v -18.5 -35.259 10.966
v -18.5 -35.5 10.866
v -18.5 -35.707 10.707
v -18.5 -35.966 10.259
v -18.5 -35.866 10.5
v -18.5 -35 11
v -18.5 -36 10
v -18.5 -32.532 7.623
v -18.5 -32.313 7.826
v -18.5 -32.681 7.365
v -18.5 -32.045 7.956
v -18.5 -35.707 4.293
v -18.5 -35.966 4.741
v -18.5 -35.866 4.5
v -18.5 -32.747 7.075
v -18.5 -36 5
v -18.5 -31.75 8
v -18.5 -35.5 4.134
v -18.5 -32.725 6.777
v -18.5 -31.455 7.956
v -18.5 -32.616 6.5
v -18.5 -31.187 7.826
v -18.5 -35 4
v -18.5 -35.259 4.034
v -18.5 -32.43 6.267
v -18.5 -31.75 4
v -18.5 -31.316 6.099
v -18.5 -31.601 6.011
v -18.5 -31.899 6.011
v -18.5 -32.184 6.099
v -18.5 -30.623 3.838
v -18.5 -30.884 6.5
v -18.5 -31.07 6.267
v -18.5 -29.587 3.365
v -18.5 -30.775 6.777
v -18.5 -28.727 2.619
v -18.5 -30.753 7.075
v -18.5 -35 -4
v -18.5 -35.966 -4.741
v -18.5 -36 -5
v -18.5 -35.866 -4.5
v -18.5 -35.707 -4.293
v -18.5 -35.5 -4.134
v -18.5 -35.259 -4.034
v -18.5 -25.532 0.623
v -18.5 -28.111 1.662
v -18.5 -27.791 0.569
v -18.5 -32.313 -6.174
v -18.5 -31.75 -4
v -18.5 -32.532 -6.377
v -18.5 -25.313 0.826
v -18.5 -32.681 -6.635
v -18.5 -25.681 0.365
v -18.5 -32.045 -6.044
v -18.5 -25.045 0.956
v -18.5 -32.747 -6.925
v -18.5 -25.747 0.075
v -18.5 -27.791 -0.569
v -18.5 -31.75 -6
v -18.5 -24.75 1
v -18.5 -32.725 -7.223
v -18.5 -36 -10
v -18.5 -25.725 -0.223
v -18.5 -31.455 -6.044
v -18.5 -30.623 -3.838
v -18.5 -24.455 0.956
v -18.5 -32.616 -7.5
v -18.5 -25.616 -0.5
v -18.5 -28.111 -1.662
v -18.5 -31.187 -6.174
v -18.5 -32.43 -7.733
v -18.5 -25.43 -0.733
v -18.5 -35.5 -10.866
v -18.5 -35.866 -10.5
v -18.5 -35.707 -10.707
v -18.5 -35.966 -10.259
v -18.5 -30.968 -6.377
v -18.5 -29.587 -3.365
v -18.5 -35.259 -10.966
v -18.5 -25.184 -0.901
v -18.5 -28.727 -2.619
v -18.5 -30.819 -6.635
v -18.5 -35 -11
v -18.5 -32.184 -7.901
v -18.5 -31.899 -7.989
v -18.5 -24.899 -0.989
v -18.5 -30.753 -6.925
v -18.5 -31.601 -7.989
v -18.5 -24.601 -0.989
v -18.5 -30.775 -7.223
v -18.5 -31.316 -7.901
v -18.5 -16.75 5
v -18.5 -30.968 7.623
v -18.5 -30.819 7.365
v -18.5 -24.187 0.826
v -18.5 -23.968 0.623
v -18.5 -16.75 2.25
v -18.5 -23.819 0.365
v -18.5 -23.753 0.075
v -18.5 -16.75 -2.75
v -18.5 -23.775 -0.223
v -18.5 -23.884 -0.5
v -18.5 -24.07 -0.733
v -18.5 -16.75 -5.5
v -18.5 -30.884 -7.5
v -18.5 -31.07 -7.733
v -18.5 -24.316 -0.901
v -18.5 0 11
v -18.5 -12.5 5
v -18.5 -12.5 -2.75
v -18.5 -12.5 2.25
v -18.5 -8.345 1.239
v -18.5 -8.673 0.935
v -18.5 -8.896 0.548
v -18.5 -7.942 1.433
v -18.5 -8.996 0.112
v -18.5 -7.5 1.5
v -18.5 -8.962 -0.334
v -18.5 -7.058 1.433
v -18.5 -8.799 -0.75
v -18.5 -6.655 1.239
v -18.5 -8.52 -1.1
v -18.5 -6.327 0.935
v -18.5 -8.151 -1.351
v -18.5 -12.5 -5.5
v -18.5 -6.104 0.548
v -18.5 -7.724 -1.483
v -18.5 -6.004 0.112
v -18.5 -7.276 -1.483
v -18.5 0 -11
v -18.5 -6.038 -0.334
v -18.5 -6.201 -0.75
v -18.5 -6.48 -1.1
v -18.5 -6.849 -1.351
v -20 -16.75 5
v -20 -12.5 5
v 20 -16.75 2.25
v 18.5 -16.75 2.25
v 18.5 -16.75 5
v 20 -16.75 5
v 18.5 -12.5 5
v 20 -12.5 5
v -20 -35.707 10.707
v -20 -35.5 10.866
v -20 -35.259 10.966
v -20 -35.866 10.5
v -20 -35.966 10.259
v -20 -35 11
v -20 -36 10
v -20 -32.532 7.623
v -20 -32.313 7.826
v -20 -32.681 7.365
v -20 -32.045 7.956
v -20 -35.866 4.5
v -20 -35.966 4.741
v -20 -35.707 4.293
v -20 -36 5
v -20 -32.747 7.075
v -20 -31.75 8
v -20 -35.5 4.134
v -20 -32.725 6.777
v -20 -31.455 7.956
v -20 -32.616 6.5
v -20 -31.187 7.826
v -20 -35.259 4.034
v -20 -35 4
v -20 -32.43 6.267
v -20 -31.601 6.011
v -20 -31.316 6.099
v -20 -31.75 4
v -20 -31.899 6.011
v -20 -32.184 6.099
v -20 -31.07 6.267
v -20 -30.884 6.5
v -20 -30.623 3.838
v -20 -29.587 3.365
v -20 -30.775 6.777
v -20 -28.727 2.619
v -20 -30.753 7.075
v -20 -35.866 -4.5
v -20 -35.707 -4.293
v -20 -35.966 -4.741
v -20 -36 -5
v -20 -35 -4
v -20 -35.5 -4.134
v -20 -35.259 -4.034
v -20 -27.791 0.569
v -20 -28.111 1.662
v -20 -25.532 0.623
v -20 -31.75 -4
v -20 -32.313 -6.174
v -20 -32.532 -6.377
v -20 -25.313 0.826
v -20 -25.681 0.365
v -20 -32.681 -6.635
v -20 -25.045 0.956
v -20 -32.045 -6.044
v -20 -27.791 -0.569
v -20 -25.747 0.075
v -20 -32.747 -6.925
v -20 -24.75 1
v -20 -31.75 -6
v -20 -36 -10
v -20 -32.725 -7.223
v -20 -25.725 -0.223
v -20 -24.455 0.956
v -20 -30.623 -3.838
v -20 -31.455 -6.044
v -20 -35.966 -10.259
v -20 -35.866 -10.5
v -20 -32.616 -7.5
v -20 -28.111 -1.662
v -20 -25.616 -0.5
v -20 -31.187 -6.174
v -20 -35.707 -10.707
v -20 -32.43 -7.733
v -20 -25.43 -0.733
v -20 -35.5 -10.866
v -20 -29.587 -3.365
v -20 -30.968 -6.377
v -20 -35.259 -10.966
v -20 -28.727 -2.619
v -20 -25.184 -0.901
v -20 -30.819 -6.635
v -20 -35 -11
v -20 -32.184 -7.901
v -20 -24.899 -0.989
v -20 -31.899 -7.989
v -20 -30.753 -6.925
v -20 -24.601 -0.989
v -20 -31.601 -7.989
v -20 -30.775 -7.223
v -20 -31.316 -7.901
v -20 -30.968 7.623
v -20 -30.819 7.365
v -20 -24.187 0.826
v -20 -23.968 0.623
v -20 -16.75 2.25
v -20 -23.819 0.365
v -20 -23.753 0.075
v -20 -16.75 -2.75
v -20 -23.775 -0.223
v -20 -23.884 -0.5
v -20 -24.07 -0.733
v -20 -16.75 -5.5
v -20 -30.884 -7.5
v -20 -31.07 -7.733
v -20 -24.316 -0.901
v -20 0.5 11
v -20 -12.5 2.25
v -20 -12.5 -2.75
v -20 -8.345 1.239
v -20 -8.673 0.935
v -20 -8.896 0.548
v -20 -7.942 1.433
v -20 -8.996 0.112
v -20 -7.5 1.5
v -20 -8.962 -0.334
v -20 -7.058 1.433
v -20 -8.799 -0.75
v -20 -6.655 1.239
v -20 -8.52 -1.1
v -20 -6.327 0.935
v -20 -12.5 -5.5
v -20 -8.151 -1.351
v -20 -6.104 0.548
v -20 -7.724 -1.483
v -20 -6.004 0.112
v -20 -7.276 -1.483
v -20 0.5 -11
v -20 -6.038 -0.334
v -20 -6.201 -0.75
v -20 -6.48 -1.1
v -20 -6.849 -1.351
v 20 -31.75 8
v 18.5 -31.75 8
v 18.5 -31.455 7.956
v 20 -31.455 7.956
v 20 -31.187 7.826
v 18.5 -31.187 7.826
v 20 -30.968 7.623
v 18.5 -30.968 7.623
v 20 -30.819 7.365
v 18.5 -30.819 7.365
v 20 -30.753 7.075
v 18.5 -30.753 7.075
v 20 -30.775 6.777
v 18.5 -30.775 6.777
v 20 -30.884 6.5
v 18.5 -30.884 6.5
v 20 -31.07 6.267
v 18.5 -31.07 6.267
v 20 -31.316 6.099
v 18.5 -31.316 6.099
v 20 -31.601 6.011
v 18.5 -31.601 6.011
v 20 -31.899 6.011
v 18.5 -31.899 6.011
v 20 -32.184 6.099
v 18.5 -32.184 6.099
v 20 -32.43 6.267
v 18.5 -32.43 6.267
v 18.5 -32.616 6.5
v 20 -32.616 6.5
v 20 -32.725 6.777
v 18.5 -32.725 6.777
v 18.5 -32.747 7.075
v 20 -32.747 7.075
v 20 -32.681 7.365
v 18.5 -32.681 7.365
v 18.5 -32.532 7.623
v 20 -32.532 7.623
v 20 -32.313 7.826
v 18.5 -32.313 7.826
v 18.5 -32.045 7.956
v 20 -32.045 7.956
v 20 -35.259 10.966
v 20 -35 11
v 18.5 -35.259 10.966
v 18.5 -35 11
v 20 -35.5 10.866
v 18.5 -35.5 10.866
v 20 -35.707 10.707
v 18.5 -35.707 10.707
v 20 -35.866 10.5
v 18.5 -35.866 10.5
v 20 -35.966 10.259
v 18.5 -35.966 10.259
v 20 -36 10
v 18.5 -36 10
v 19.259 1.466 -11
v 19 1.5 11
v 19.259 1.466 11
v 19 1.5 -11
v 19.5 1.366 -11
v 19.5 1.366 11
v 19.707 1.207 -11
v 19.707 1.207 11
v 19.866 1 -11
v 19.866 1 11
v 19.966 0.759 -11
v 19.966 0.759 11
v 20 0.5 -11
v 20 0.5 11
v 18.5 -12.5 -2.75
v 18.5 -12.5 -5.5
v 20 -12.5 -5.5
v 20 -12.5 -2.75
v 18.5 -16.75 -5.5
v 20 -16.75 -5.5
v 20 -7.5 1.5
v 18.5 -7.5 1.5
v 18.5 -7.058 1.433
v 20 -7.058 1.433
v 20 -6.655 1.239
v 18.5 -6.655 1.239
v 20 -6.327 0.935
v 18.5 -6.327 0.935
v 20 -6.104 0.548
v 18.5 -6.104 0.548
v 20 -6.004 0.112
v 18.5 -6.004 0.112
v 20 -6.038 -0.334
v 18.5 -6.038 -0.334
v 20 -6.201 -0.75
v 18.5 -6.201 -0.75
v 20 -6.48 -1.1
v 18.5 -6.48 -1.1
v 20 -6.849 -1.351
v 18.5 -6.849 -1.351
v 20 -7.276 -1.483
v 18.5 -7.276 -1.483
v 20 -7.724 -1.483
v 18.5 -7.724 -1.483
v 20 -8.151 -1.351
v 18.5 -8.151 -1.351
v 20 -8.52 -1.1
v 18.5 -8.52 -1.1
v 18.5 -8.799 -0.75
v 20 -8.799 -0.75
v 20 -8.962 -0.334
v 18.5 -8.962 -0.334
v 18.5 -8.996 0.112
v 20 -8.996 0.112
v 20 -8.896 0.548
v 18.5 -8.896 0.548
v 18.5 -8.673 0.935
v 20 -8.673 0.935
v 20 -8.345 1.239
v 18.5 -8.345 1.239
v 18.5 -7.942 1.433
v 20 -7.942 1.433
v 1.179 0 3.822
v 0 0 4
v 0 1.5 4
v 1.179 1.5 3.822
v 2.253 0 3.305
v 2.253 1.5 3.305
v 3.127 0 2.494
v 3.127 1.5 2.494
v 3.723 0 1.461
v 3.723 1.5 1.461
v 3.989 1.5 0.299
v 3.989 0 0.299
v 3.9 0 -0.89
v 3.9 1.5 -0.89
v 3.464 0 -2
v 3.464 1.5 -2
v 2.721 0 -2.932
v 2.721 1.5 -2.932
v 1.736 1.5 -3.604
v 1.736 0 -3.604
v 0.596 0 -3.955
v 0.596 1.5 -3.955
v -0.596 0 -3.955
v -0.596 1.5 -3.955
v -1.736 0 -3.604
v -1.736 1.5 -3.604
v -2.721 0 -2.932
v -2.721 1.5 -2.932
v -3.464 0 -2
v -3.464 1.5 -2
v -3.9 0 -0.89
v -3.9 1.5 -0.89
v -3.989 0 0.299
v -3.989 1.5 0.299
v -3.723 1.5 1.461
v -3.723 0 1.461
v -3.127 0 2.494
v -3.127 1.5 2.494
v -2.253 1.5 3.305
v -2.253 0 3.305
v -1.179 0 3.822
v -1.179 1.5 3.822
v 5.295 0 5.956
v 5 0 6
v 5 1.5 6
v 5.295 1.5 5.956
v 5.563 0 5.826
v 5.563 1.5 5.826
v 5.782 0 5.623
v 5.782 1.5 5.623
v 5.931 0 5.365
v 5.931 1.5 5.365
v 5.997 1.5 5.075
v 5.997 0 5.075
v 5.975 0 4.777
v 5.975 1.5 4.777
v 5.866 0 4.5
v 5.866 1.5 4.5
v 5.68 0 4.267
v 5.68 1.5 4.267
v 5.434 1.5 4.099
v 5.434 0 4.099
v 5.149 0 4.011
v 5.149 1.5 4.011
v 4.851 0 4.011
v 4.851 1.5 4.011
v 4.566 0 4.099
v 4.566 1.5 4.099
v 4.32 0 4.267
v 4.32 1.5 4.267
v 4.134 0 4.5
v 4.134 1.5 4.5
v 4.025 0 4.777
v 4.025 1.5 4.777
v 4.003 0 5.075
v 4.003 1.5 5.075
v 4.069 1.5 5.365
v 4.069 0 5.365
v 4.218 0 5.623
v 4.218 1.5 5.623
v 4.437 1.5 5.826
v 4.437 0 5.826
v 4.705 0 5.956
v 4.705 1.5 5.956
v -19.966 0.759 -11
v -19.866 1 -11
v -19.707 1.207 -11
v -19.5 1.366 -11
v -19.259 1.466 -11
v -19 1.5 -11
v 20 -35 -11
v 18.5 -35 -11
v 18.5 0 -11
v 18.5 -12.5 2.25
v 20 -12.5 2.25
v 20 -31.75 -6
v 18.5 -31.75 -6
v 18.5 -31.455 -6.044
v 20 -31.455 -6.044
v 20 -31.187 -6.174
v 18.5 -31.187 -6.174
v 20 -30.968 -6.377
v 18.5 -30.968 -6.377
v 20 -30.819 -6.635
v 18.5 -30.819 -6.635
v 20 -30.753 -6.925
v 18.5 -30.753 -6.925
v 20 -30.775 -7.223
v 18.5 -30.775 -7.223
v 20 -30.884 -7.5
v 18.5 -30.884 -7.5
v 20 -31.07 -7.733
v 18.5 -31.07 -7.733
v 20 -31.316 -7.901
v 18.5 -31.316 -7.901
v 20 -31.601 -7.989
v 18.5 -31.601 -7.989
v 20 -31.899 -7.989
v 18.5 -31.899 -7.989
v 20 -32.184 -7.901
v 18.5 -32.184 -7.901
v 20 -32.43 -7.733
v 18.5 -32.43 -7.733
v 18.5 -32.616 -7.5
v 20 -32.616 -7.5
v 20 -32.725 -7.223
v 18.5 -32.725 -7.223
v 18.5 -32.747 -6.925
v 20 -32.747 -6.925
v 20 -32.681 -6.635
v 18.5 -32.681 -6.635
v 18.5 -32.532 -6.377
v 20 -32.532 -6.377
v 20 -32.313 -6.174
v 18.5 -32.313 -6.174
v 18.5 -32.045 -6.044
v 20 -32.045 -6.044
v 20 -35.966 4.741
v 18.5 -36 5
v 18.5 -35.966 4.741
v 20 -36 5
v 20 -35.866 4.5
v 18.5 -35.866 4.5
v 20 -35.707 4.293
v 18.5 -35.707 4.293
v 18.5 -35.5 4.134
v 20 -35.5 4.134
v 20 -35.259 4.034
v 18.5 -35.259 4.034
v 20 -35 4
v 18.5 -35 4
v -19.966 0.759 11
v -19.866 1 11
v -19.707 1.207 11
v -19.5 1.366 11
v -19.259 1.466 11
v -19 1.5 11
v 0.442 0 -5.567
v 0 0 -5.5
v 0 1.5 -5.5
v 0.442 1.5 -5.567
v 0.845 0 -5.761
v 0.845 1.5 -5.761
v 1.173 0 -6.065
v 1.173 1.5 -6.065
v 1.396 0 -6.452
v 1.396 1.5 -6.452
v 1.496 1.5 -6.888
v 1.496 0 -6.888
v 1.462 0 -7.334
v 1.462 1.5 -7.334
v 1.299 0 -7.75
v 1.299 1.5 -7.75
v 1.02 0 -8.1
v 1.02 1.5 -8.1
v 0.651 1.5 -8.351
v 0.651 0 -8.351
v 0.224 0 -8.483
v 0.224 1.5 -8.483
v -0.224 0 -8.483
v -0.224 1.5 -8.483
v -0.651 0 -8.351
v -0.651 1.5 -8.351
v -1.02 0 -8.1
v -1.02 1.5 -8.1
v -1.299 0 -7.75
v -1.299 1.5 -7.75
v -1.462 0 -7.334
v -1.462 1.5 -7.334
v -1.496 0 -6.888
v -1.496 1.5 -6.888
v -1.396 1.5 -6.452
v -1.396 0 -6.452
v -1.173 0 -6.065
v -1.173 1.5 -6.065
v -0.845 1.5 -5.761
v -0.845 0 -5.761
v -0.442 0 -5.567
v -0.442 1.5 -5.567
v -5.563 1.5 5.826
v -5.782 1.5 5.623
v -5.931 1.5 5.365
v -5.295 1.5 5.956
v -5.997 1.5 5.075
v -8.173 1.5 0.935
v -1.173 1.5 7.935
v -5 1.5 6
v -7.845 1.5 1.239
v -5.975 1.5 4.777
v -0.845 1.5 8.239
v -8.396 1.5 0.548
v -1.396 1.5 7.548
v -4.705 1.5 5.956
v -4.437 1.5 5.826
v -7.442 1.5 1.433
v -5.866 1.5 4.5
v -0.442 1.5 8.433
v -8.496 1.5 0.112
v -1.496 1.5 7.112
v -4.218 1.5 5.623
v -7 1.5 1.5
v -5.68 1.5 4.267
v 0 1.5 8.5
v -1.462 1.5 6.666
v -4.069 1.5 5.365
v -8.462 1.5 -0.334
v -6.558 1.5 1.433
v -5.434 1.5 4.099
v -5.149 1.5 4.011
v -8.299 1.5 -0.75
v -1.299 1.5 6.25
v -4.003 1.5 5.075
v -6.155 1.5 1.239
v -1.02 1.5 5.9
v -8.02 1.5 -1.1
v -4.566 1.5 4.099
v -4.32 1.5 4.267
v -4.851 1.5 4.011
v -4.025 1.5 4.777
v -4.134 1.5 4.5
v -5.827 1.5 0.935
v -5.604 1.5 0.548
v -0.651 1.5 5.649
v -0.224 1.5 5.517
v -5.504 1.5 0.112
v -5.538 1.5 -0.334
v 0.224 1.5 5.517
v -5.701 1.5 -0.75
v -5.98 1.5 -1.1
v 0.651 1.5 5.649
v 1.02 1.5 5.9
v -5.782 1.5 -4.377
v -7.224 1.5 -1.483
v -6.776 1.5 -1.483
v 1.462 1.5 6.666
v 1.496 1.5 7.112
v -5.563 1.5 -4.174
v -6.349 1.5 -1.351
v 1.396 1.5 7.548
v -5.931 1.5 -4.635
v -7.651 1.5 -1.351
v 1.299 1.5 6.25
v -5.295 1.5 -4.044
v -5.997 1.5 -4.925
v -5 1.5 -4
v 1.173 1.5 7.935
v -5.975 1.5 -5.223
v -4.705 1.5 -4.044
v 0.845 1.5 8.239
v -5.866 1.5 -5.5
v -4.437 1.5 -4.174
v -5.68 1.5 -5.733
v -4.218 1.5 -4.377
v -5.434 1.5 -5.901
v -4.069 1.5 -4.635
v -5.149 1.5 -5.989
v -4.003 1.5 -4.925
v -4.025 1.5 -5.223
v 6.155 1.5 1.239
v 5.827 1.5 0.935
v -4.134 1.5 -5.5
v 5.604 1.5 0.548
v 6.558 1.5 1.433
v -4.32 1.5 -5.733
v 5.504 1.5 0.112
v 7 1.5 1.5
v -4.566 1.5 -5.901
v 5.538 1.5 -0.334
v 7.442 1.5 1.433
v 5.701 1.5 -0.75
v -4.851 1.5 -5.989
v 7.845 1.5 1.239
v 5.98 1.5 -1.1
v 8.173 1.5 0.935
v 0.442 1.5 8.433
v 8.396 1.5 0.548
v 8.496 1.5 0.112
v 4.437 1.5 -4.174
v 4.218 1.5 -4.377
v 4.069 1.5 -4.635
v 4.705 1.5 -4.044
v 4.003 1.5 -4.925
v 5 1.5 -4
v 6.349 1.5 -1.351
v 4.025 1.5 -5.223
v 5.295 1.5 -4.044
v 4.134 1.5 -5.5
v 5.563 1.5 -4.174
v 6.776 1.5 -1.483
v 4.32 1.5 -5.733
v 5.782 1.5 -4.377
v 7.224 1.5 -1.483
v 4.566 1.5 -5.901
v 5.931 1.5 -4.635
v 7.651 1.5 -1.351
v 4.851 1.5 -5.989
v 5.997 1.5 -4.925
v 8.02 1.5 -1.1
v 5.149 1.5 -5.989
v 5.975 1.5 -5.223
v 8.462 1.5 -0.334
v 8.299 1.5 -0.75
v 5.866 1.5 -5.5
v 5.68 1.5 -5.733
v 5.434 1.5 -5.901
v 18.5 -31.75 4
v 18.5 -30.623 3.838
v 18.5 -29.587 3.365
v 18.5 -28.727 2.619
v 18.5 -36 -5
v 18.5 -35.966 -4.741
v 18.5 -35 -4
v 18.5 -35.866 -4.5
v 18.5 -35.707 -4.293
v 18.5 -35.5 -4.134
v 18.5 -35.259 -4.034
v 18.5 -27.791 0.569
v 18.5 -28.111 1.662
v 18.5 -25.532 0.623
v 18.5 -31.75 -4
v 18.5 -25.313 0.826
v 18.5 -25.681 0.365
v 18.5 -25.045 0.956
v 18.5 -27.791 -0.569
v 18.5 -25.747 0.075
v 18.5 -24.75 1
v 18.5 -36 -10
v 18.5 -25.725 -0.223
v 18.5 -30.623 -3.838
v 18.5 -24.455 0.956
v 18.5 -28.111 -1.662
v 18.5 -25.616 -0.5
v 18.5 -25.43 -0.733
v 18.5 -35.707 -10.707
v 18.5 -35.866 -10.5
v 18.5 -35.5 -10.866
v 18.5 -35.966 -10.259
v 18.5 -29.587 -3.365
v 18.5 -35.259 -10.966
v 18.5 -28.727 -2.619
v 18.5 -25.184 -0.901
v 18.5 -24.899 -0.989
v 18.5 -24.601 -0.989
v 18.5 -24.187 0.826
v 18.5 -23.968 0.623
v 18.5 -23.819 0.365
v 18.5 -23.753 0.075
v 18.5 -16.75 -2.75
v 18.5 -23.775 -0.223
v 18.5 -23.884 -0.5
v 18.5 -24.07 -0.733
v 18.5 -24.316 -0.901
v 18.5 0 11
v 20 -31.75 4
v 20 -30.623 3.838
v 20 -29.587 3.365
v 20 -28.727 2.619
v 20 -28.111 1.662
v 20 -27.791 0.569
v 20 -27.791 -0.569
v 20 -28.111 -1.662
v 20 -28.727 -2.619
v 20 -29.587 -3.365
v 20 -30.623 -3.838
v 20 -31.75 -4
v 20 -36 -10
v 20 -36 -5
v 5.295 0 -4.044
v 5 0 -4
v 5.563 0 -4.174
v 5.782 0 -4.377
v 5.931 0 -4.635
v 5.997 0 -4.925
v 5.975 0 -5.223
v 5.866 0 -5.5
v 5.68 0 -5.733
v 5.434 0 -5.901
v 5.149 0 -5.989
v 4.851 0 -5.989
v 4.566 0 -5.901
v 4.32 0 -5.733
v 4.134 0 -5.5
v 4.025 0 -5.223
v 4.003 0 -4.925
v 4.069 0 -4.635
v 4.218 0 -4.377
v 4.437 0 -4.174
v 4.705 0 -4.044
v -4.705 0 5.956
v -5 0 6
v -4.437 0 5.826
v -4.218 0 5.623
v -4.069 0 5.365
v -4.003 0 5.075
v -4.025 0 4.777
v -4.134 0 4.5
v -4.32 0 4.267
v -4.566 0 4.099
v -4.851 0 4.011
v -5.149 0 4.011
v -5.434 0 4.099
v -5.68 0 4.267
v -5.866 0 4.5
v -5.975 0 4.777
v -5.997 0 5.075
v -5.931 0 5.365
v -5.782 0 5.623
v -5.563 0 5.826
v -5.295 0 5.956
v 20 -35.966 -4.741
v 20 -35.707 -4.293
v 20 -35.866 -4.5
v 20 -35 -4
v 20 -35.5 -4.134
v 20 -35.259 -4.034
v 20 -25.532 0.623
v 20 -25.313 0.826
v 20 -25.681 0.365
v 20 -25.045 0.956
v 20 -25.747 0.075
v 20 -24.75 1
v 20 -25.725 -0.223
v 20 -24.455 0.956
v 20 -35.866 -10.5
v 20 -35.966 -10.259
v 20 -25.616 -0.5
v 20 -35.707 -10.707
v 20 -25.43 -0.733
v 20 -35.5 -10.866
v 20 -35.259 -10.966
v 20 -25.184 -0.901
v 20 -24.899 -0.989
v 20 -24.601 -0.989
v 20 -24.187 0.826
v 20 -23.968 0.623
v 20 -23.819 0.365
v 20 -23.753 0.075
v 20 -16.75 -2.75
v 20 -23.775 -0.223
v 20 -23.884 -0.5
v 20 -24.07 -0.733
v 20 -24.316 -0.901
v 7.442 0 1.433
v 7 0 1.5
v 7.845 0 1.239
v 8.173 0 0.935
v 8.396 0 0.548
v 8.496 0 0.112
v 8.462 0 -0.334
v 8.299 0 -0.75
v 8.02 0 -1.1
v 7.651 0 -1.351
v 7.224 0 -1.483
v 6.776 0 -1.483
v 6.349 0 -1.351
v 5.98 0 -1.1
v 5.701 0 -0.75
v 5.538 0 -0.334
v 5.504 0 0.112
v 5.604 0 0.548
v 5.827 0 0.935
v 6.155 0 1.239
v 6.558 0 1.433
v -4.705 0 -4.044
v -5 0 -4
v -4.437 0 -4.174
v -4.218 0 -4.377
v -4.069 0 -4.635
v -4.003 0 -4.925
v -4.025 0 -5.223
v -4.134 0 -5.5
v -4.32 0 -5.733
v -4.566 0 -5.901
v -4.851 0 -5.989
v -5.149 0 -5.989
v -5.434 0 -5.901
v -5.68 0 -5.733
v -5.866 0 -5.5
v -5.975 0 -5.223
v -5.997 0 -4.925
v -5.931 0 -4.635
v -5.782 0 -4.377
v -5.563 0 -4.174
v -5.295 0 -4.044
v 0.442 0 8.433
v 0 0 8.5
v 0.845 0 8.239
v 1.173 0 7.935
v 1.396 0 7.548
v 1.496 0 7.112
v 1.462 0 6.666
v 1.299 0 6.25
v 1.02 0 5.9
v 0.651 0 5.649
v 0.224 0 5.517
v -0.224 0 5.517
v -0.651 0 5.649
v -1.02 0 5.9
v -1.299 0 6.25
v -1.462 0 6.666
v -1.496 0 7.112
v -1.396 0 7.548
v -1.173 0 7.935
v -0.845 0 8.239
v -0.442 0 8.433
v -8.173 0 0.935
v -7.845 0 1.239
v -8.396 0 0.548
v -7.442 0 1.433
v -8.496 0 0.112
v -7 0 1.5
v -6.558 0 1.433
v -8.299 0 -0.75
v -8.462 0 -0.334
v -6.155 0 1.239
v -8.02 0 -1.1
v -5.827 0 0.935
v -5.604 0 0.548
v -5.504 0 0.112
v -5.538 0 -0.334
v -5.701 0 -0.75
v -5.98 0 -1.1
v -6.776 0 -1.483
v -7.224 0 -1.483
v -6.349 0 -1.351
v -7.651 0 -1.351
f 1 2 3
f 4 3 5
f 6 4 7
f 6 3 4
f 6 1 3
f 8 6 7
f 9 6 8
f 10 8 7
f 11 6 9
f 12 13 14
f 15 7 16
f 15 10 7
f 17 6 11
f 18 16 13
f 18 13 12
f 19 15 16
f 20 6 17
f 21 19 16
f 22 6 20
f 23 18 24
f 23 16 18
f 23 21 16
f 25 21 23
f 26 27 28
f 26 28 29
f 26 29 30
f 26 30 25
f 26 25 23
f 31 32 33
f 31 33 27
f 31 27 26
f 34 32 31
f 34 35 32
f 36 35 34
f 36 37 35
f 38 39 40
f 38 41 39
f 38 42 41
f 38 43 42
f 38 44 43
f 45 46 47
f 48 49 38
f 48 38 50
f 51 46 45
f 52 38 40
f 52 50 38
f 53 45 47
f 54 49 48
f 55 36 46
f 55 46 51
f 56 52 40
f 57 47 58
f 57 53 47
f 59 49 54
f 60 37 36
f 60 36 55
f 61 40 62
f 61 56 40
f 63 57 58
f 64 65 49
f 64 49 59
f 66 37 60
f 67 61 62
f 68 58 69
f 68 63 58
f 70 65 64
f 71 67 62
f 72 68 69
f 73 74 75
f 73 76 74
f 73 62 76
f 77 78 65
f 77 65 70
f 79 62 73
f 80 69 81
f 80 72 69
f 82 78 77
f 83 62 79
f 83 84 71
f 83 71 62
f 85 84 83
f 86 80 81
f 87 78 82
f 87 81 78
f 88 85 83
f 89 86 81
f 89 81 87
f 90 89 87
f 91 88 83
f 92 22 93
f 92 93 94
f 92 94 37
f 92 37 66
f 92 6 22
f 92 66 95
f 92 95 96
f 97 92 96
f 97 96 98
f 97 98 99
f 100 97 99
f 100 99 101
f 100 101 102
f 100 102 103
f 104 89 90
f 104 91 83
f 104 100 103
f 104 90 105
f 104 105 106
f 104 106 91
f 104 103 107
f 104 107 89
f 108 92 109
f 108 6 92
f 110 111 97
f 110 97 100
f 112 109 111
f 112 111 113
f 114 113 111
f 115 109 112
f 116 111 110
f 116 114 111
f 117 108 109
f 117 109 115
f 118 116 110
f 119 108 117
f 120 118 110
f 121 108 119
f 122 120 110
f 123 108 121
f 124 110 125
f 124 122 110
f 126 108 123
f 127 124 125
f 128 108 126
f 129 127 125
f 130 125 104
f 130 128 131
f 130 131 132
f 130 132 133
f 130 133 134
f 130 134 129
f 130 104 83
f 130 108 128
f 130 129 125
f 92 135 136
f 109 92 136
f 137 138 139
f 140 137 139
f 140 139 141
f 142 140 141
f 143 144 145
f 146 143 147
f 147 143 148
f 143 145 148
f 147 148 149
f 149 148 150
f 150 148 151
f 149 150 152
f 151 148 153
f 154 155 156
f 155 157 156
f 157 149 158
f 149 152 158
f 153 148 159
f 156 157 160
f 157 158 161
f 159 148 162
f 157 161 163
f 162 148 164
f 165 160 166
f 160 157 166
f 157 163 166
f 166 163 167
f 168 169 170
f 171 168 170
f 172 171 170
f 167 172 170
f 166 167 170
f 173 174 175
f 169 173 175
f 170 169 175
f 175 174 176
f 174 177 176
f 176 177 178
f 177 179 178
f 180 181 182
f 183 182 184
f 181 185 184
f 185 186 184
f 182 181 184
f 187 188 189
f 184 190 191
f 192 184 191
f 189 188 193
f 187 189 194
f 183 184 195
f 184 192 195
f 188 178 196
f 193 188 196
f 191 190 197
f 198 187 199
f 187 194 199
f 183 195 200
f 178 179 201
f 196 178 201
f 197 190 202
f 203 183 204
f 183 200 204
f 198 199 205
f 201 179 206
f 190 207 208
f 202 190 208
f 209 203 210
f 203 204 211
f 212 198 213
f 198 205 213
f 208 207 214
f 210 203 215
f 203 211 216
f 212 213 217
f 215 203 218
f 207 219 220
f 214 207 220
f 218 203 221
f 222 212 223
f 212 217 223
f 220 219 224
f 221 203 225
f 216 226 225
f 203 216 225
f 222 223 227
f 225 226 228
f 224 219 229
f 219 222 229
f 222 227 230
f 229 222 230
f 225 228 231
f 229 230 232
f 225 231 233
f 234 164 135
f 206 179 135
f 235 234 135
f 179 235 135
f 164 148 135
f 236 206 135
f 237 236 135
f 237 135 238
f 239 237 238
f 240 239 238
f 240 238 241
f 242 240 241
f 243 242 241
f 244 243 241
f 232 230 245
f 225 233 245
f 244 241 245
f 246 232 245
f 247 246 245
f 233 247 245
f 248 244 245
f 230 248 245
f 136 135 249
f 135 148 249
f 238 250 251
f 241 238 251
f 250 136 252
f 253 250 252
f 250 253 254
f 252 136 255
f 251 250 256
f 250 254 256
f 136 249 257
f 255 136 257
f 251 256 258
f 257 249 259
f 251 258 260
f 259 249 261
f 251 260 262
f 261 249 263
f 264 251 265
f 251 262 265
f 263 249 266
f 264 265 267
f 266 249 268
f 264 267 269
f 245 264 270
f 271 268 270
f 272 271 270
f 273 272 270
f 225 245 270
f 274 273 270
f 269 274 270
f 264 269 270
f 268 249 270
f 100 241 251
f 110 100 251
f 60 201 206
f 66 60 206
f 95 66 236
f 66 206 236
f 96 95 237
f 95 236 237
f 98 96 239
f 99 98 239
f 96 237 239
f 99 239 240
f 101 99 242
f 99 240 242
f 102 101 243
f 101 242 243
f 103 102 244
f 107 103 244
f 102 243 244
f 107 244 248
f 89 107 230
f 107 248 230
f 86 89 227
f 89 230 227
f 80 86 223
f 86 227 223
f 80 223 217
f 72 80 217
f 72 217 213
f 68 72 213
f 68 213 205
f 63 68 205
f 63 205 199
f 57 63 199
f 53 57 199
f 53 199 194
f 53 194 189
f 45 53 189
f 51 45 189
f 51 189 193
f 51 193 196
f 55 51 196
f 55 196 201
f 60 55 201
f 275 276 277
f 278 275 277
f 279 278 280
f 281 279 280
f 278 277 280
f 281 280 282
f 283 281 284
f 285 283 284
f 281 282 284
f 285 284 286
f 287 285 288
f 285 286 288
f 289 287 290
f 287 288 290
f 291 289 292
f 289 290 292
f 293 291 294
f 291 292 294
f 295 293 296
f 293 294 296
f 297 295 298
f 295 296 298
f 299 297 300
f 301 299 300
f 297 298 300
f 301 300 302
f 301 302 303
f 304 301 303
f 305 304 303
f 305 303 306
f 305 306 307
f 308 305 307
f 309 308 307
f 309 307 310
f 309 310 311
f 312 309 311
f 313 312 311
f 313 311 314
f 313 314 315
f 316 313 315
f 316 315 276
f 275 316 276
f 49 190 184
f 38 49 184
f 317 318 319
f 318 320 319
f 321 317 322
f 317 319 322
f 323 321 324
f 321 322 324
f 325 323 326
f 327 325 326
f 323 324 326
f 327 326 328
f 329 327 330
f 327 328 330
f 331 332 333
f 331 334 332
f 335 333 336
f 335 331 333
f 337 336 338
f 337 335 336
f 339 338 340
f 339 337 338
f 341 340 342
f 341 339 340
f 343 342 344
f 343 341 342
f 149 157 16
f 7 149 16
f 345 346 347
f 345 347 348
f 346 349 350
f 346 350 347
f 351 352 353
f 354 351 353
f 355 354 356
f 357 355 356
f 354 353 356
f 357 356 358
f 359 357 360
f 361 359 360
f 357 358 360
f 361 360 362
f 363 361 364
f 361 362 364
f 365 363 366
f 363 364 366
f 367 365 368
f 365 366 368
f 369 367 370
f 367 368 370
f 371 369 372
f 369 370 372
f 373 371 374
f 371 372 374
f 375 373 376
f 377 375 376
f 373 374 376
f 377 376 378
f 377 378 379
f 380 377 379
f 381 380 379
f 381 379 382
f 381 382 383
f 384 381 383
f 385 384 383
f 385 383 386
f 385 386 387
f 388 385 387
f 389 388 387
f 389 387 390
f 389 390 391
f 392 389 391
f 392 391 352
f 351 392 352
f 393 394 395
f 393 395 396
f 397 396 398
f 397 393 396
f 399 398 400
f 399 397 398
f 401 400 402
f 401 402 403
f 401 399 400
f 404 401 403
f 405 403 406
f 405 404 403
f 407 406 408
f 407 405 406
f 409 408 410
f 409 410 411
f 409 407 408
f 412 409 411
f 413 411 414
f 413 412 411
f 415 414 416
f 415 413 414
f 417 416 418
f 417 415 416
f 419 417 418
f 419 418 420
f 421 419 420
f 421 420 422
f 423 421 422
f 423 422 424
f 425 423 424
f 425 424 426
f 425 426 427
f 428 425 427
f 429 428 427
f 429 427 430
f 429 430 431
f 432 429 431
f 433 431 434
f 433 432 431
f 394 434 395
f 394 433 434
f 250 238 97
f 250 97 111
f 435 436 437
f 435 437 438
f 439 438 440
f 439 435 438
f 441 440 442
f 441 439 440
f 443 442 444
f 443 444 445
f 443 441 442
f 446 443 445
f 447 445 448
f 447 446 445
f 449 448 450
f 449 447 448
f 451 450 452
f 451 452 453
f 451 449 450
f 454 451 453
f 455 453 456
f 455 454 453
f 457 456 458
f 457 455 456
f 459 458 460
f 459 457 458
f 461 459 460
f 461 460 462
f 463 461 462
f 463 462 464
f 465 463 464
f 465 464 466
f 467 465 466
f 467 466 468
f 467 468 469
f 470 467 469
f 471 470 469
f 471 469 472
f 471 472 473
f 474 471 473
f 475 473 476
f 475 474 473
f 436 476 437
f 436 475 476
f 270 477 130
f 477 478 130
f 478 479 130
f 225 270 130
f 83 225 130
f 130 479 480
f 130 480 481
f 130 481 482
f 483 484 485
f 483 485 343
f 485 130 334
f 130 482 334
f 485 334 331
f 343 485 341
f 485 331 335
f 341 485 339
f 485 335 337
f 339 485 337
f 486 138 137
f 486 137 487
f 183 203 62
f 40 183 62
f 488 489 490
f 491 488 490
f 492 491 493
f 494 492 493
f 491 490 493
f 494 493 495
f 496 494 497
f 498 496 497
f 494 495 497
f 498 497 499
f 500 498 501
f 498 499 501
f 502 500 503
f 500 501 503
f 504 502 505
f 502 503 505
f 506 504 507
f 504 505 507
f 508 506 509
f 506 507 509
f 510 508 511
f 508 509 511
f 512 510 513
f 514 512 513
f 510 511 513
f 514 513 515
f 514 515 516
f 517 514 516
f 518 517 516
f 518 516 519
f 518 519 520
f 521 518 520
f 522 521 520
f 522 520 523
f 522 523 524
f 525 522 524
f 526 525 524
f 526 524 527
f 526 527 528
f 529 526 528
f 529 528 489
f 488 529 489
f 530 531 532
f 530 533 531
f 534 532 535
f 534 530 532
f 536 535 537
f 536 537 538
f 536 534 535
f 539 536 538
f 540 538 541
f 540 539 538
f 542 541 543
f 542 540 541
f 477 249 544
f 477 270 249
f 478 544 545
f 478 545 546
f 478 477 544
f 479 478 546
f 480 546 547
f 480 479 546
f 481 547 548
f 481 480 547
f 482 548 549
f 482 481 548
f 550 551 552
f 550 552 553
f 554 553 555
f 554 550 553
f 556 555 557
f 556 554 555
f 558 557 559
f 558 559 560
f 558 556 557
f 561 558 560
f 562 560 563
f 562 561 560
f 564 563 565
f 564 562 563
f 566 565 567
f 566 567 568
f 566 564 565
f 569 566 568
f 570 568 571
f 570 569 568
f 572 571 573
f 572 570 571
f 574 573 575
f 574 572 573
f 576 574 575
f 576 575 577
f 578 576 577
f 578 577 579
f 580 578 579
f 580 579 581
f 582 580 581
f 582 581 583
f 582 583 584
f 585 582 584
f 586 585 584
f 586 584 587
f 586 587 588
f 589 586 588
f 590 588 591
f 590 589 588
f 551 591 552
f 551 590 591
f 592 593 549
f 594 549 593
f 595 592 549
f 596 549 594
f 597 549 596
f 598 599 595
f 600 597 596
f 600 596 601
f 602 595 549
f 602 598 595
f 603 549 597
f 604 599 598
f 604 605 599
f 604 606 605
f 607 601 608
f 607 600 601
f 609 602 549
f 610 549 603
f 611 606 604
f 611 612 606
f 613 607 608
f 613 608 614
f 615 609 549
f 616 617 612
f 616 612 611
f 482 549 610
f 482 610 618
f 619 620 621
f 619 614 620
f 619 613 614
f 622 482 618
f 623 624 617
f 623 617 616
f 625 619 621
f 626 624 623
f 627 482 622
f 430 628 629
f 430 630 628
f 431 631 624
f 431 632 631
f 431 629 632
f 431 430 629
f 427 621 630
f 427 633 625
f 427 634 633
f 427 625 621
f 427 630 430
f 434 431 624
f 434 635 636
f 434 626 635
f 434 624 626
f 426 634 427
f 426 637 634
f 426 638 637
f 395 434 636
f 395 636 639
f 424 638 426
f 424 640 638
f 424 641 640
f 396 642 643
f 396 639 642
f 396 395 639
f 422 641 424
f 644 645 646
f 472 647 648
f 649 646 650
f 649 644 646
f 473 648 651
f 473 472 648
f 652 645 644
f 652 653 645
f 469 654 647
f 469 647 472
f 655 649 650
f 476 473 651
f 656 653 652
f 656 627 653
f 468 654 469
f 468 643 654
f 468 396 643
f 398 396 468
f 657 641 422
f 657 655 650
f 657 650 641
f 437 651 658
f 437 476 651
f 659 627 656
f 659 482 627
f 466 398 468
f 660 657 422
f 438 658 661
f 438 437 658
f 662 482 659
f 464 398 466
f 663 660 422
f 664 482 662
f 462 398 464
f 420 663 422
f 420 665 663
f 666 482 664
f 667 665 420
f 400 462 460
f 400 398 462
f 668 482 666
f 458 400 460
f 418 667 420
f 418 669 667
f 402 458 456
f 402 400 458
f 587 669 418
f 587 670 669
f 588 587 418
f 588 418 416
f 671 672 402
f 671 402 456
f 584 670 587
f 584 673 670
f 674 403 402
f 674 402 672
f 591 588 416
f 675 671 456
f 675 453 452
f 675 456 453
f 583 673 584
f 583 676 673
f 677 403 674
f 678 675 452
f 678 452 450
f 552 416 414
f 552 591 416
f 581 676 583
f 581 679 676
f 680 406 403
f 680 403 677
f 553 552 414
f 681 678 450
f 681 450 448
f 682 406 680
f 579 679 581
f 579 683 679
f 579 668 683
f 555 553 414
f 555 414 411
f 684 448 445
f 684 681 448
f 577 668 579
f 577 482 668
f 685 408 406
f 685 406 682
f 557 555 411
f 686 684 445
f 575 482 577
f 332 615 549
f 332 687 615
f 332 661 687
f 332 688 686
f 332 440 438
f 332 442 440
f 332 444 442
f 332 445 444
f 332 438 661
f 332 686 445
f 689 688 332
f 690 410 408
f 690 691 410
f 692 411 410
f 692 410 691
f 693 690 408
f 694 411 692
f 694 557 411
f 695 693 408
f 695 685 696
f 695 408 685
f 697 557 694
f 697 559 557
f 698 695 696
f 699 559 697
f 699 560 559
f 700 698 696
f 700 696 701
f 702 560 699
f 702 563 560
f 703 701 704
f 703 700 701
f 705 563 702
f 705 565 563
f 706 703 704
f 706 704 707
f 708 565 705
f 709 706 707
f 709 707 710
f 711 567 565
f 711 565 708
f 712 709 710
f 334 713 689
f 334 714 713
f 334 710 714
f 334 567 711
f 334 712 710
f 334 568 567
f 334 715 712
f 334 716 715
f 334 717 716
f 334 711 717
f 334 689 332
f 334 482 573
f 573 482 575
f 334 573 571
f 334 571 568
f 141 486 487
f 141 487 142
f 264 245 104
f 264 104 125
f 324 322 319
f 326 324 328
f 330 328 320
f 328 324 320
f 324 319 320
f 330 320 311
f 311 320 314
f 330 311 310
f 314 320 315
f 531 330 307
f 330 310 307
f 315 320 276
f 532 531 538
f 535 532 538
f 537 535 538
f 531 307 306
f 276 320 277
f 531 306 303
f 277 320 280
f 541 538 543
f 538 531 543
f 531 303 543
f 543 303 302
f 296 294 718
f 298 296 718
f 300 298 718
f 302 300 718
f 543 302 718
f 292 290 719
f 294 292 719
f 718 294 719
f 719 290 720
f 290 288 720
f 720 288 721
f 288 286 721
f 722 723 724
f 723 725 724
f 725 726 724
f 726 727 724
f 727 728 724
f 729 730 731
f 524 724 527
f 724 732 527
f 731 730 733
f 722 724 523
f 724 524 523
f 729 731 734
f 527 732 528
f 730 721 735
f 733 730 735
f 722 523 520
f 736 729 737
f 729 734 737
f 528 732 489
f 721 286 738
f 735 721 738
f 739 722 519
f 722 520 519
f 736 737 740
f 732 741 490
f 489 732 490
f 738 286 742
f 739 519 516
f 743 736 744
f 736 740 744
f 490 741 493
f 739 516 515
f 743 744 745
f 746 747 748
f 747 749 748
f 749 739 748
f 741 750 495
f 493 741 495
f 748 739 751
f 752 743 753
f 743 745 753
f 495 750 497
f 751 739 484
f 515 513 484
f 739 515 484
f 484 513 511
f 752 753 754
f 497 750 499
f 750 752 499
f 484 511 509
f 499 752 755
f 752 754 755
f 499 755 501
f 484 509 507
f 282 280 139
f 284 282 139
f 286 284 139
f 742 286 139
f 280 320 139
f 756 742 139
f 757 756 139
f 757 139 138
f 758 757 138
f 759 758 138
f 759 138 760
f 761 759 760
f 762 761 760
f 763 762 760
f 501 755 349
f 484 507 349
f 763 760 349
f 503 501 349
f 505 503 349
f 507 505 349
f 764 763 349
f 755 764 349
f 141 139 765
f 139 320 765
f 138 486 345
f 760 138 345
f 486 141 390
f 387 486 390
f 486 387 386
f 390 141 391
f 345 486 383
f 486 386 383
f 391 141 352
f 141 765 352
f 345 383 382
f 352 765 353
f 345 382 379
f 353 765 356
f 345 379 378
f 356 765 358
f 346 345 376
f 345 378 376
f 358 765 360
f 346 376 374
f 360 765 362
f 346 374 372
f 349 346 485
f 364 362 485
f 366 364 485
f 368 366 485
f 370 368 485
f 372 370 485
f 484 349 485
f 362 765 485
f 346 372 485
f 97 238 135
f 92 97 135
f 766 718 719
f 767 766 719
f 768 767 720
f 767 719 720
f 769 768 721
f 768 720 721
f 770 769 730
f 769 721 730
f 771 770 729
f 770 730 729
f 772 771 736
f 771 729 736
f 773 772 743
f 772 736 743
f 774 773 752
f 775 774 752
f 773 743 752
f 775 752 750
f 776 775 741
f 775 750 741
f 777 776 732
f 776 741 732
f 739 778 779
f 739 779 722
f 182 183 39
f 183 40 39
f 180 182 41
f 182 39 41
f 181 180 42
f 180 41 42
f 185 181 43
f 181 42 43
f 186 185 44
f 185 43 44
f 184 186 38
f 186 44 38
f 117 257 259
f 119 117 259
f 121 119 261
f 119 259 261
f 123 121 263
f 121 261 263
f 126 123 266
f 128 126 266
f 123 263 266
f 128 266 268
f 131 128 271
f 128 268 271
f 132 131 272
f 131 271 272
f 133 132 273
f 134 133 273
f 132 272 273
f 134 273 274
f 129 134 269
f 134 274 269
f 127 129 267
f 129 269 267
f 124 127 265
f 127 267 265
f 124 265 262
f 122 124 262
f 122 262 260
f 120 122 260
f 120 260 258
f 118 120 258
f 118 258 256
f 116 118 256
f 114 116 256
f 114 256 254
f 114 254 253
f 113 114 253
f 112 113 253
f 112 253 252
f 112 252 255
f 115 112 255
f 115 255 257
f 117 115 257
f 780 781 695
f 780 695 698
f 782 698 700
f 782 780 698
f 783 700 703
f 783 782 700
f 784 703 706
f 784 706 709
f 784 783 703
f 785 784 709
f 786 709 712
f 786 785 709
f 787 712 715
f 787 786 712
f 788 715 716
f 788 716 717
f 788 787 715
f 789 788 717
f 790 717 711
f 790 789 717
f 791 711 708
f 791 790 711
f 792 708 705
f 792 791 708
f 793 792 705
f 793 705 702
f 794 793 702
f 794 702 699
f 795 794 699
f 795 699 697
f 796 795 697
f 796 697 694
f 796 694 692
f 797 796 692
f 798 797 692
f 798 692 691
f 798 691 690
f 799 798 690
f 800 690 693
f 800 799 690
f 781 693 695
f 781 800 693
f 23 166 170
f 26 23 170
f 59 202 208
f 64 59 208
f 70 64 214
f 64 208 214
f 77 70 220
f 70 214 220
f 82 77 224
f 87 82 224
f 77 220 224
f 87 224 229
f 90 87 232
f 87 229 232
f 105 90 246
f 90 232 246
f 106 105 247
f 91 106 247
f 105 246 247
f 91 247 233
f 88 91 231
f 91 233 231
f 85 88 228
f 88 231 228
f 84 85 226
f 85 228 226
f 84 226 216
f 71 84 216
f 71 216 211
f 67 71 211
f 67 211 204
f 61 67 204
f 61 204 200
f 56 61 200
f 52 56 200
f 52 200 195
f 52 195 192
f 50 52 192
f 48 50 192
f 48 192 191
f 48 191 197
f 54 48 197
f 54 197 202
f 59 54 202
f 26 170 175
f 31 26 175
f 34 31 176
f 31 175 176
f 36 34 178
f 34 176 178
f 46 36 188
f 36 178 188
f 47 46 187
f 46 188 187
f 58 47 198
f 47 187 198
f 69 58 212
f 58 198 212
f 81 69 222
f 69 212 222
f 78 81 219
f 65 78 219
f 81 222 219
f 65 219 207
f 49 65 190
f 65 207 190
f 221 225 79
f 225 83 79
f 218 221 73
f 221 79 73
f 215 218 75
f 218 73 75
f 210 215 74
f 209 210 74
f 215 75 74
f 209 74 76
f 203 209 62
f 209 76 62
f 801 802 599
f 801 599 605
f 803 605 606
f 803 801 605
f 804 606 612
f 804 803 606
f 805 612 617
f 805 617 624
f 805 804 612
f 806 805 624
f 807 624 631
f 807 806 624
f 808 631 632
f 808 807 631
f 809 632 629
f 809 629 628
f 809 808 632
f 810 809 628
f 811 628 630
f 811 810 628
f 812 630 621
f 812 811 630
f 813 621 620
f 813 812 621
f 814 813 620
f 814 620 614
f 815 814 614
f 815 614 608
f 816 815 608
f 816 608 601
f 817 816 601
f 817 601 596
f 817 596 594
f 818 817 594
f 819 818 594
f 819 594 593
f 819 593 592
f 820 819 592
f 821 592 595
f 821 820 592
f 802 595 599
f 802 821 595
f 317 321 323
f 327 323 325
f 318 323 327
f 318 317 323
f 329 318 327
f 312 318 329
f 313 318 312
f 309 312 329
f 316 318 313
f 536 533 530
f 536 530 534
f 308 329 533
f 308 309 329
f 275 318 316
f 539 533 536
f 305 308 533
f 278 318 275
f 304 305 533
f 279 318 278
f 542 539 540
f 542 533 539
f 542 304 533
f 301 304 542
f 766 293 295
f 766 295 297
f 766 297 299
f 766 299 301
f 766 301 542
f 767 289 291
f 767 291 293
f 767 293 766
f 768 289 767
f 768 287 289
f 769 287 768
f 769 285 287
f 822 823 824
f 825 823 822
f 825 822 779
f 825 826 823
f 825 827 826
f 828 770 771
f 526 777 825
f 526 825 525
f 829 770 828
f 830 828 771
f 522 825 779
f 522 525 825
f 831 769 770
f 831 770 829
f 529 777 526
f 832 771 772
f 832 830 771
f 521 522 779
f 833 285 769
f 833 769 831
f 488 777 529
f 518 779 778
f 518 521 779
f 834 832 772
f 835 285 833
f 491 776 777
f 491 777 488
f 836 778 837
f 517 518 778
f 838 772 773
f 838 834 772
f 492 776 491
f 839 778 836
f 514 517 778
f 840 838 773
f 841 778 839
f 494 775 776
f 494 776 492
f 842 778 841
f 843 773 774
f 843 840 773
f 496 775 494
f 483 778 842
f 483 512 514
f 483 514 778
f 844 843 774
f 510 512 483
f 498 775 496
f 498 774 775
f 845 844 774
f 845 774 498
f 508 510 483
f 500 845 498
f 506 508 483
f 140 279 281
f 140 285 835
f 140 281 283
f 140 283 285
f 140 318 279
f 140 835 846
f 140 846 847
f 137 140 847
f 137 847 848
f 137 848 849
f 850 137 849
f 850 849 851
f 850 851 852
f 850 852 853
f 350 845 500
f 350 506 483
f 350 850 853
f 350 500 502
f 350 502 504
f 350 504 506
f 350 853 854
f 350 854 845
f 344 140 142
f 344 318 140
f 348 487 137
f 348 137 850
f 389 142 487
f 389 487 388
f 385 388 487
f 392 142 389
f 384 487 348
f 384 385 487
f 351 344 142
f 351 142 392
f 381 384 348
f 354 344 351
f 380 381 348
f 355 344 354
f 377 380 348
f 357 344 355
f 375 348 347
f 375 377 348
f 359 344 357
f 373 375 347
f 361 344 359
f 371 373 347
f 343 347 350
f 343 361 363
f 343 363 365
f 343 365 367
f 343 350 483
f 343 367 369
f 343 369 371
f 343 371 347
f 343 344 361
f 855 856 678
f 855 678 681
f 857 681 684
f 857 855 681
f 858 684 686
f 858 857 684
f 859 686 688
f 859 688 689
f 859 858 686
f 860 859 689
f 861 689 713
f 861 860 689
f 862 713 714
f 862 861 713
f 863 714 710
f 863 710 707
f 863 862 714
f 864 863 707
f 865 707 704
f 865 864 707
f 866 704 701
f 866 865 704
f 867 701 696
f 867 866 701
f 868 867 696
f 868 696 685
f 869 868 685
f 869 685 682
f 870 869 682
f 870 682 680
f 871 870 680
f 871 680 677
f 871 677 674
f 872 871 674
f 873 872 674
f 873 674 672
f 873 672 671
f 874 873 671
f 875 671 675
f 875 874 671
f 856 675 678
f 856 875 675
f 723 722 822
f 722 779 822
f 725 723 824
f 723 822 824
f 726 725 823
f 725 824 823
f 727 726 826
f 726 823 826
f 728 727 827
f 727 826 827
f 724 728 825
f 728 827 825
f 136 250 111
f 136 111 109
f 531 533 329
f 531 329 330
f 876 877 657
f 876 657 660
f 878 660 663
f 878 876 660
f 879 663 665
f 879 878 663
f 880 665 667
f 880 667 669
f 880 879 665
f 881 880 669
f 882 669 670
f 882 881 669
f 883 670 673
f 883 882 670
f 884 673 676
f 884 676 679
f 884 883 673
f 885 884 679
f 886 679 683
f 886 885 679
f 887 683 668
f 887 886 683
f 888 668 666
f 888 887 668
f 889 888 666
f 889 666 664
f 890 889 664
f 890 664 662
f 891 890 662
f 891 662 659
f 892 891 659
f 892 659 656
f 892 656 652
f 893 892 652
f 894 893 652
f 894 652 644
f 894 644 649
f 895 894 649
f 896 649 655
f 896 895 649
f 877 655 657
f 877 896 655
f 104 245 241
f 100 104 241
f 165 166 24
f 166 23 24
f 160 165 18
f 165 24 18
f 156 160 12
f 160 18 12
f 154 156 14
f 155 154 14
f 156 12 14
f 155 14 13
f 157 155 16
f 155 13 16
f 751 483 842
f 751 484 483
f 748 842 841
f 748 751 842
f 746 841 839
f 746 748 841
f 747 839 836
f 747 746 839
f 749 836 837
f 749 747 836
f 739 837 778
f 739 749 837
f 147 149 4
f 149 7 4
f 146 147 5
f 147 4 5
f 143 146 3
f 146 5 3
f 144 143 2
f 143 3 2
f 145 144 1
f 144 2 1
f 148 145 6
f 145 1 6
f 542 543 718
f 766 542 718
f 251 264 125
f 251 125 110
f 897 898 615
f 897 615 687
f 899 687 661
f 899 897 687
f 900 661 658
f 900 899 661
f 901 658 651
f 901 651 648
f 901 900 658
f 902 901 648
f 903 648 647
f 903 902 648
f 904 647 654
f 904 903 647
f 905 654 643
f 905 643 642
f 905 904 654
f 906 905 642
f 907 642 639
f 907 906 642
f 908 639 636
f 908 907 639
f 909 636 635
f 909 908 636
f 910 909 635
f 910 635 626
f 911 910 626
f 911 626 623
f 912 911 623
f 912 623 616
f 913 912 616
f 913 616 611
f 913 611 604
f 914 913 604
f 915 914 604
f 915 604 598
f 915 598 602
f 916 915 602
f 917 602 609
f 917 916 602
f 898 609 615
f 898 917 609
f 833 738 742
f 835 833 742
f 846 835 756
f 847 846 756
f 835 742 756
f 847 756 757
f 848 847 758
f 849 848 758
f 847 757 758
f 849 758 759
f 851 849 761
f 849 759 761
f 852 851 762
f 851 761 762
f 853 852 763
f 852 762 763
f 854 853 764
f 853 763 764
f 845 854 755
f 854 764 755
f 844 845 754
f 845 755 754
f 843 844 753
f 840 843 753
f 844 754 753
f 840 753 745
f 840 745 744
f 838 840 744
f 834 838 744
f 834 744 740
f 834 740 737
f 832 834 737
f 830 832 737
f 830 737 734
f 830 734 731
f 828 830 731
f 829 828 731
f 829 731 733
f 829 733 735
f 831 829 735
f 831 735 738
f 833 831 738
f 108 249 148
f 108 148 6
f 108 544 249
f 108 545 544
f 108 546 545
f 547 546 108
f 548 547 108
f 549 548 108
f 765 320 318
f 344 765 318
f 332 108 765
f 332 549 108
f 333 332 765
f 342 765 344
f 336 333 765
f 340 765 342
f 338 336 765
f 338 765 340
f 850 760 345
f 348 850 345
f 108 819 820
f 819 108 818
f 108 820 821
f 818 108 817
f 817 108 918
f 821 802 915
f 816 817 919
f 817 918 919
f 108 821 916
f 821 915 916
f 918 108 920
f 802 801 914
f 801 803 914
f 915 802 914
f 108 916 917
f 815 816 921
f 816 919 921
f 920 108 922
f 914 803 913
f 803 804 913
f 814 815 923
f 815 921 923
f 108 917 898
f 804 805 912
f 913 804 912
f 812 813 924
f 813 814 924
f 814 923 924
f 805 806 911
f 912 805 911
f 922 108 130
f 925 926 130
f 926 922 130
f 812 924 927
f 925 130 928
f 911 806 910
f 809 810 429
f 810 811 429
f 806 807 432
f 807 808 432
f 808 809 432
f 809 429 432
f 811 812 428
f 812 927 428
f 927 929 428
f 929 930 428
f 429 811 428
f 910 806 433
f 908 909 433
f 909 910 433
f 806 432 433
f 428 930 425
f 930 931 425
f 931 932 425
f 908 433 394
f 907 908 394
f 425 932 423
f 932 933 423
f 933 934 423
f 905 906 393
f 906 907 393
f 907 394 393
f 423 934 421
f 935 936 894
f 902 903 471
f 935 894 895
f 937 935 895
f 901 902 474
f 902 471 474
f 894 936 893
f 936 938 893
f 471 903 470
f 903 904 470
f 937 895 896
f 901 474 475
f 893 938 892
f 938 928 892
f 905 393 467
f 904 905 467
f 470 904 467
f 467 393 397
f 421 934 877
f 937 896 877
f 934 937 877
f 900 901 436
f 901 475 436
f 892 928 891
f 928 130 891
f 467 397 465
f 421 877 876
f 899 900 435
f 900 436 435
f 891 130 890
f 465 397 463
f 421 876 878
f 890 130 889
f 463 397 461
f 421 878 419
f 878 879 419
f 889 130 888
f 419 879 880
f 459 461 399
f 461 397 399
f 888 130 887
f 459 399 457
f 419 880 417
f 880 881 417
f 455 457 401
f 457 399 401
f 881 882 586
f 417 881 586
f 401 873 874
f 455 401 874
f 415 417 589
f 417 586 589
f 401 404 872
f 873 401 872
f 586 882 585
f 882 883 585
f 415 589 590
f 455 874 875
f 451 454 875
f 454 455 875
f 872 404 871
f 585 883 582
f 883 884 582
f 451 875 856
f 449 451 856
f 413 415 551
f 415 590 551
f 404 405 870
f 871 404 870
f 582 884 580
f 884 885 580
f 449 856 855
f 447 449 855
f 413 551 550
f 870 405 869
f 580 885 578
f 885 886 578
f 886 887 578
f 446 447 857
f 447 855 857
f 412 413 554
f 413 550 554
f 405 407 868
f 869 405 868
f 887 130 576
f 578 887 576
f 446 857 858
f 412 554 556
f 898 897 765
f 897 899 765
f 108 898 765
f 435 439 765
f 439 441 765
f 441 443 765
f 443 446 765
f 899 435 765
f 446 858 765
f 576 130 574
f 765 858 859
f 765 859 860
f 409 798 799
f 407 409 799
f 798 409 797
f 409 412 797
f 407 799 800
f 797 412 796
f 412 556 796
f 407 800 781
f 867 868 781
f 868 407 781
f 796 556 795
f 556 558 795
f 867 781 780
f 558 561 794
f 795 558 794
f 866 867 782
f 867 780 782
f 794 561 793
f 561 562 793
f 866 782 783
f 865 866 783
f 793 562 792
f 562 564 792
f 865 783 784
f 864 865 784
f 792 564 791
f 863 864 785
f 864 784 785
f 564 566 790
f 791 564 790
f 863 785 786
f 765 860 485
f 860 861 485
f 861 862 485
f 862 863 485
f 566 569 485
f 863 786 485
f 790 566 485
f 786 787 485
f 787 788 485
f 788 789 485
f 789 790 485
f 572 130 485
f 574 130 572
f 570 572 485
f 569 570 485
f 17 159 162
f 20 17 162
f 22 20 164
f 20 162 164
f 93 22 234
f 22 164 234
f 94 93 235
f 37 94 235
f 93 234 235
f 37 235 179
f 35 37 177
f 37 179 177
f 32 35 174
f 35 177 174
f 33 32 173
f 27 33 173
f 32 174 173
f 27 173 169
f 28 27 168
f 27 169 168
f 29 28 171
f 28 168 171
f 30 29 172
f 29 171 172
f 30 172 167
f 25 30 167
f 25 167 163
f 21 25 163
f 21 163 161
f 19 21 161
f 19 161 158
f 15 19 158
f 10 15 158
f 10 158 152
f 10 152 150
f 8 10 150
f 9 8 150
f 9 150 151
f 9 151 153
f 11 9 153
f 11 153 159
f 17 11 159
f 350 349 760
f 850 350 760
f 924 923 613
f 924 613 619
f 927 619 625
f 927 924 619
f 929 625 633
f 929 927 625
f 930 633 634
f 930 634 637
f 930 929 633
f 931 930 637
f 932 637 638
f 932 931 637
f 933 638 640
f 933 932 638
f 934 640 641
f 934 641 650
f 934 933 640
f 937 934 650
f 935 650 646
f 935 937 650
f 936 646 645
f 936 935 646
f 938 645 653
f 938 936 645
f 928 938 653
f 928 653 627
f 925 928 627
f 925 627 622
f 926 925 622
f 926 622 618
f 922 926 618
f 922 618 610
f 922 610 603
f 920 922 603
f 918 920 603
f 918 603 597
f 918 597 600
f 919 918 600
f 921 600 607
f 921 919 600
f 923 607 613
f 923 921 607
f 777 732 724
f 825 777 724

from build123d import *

# Parameters (mm, degrees)
SKETCH1_W           = 40
SKETCH1_H           = 22
SKETCH1_R           = 4
SKETCH1_R_2         = 1.5
SKETCH1_R_3         = 1
BOSS_EXTRUDE1_DEPTH = 1.5
SKETCH2_W           = 1.5
SKETCH2_H           = 22
BOSS_EXTRUDE2_DEPTH = 36
FILLET1_R           = 1
SKETCH3_R           = 1.5
SKETCH3_R_2         = 1
SKETCH3_W           = 2.75
SKETCH3_H           = 4.25
CUT_EXTRUDE1_DEPTH  = 55.927224579
FILLET2_R           = 1


with BuildPart() as part:
    # Sketch1 → Boss-Extrude1 (new body)
    with BuildSketch(Plane(origin=(0, 0, 0), x_dir=(1, 0, 0), z_dir=(0, 1, 0))):
        Rectangle(SKETCH1_W, SKETCH1_H)
        with Locations(Location((0, 0, 0), (0, 0, 270))):
            Circle(SKETCH1_R, mode=Mode.SUBTRACT)
        with Locations(Location((0, 7, 0), (0, 0, 270))):
            Circle(SKETCH1_R_2, mode=Mode.SUBTRACT)
        with Locations(Location((7, 0, 0), (0, 0, 270))):
            Circle(SKETCH1_R_2, mode=Mode.SUBTRACT)
        with Locations(Location((0, -7, 0), (0, 0, 270))):
            Circle(SKETCH1_R_2, mode=Mode.SUBTRACT)
        with Locations(Location((-7, 0, 0), (0, 0, 270))):
            Circle(SKETCH1_R_2, mode=Mode.SUBTRACT)
        with Locations(Location((5, 5, 0), (0, 0, 270))):
            Circle(SKETCH1_R_3, mode=Mode.SUBTRACT)
        with Locations(Location((5, -5, 0), (0, 0, 270))):
            Circle(SKETCH1_R_3, mode=Mode.SUBTRACT)
        with Locations(Location((-5, -5, 0), (0, 0, 270))):
            Circle(SKETCH1_R_3, mode=Mode.SUBTRACT)
        with Locations(Location((-5, 5, 0), (0, 0, 270))):
            Circle(SKETCH1_R_3, mode=Mode.SUBTRACT)
    extrude(amount=BOSS_EXTRUDE1_DEPTH)

    # Sketch2 → Boss-Extrude2 (add)
    with BuildSketch(Plane(origin=(0, 0, 0), x_dir=(-1, 0, 0), z_dir=(0, -1, 0))):
        with Locations((-19.25, 0)):
            Rectangle(SKETCH2_W, SKETCH2_H)
    boss_extrude2 = extrude(amount=BOSS_EXTRUDE2_DEPTH)

    # Mirror1: Boss-Extrude2 across plane
    add(boss_extrude2.mirror(Plane(origin=(0, 0, 0), x_dir=(0, 0, 1), z_dir=(1, 0, 0))))

    # Fillet1
    fillet1_edges = [part.edges().sort_by_distance(p)[0] for p in [
        (-20, 1.5, 0),
        (20, 1.5, 0),
    ]]
    fillet(fillet1_edges, radius=FILLET1_R)

    # Sketch3 → Cut-Extrude1 (cut, through all)
    with BuildSketch(Plane.ZY.offset(20)):
        with Locations((0, -7.5)):
            Circle(SKETCH3_R)
        with Locations((0, -24.75)):
            Circle(SKETCH3_R_2)
        with Locations((-7, -31.75)):
            Circle(SKETCH3_R_2)
        with Locations((7, -31.75)):
            Circle(SKETCH3_R_2)
        with BuildLine():
            Line((-4, -31.75), (-4, -36))
            Line((-4, -36), (4, -36))
            Line((4, -36), (4, -31.75))
            ThreePointArc((4, -31.75), (0, -27.75), (-4, -31.75))
        make_face()
        with Locations((-4.125, -14.625)):
            Rectangle(SKETCH3_W, SKETCH3_H)
        with Locations((3.625, -14.625)):
            Rectangle(SKETCH3_W, SKETCH3_H)
    extrude(amount=-CUT_EXTRUDE1_DEPTH, mode=Mode.SUBTRACT)

    # Fillet2
    fillet2_edges = [part.edges().sort_by_distance(p)[0] for p in [
        (-19.25, -36, -4),
        (-19.25, -36, 4),
        (19.25, -36, 4),
        (19.25, -36, -4),
        (19.25, -36, 11),
        (19.25, -36, -11),
        (-19.25, -36, -11),
        (-19.25, -36, 11),
    ]]
    fillet(fillet2_edges, radius=FILLET2_R)


solid = part.part
